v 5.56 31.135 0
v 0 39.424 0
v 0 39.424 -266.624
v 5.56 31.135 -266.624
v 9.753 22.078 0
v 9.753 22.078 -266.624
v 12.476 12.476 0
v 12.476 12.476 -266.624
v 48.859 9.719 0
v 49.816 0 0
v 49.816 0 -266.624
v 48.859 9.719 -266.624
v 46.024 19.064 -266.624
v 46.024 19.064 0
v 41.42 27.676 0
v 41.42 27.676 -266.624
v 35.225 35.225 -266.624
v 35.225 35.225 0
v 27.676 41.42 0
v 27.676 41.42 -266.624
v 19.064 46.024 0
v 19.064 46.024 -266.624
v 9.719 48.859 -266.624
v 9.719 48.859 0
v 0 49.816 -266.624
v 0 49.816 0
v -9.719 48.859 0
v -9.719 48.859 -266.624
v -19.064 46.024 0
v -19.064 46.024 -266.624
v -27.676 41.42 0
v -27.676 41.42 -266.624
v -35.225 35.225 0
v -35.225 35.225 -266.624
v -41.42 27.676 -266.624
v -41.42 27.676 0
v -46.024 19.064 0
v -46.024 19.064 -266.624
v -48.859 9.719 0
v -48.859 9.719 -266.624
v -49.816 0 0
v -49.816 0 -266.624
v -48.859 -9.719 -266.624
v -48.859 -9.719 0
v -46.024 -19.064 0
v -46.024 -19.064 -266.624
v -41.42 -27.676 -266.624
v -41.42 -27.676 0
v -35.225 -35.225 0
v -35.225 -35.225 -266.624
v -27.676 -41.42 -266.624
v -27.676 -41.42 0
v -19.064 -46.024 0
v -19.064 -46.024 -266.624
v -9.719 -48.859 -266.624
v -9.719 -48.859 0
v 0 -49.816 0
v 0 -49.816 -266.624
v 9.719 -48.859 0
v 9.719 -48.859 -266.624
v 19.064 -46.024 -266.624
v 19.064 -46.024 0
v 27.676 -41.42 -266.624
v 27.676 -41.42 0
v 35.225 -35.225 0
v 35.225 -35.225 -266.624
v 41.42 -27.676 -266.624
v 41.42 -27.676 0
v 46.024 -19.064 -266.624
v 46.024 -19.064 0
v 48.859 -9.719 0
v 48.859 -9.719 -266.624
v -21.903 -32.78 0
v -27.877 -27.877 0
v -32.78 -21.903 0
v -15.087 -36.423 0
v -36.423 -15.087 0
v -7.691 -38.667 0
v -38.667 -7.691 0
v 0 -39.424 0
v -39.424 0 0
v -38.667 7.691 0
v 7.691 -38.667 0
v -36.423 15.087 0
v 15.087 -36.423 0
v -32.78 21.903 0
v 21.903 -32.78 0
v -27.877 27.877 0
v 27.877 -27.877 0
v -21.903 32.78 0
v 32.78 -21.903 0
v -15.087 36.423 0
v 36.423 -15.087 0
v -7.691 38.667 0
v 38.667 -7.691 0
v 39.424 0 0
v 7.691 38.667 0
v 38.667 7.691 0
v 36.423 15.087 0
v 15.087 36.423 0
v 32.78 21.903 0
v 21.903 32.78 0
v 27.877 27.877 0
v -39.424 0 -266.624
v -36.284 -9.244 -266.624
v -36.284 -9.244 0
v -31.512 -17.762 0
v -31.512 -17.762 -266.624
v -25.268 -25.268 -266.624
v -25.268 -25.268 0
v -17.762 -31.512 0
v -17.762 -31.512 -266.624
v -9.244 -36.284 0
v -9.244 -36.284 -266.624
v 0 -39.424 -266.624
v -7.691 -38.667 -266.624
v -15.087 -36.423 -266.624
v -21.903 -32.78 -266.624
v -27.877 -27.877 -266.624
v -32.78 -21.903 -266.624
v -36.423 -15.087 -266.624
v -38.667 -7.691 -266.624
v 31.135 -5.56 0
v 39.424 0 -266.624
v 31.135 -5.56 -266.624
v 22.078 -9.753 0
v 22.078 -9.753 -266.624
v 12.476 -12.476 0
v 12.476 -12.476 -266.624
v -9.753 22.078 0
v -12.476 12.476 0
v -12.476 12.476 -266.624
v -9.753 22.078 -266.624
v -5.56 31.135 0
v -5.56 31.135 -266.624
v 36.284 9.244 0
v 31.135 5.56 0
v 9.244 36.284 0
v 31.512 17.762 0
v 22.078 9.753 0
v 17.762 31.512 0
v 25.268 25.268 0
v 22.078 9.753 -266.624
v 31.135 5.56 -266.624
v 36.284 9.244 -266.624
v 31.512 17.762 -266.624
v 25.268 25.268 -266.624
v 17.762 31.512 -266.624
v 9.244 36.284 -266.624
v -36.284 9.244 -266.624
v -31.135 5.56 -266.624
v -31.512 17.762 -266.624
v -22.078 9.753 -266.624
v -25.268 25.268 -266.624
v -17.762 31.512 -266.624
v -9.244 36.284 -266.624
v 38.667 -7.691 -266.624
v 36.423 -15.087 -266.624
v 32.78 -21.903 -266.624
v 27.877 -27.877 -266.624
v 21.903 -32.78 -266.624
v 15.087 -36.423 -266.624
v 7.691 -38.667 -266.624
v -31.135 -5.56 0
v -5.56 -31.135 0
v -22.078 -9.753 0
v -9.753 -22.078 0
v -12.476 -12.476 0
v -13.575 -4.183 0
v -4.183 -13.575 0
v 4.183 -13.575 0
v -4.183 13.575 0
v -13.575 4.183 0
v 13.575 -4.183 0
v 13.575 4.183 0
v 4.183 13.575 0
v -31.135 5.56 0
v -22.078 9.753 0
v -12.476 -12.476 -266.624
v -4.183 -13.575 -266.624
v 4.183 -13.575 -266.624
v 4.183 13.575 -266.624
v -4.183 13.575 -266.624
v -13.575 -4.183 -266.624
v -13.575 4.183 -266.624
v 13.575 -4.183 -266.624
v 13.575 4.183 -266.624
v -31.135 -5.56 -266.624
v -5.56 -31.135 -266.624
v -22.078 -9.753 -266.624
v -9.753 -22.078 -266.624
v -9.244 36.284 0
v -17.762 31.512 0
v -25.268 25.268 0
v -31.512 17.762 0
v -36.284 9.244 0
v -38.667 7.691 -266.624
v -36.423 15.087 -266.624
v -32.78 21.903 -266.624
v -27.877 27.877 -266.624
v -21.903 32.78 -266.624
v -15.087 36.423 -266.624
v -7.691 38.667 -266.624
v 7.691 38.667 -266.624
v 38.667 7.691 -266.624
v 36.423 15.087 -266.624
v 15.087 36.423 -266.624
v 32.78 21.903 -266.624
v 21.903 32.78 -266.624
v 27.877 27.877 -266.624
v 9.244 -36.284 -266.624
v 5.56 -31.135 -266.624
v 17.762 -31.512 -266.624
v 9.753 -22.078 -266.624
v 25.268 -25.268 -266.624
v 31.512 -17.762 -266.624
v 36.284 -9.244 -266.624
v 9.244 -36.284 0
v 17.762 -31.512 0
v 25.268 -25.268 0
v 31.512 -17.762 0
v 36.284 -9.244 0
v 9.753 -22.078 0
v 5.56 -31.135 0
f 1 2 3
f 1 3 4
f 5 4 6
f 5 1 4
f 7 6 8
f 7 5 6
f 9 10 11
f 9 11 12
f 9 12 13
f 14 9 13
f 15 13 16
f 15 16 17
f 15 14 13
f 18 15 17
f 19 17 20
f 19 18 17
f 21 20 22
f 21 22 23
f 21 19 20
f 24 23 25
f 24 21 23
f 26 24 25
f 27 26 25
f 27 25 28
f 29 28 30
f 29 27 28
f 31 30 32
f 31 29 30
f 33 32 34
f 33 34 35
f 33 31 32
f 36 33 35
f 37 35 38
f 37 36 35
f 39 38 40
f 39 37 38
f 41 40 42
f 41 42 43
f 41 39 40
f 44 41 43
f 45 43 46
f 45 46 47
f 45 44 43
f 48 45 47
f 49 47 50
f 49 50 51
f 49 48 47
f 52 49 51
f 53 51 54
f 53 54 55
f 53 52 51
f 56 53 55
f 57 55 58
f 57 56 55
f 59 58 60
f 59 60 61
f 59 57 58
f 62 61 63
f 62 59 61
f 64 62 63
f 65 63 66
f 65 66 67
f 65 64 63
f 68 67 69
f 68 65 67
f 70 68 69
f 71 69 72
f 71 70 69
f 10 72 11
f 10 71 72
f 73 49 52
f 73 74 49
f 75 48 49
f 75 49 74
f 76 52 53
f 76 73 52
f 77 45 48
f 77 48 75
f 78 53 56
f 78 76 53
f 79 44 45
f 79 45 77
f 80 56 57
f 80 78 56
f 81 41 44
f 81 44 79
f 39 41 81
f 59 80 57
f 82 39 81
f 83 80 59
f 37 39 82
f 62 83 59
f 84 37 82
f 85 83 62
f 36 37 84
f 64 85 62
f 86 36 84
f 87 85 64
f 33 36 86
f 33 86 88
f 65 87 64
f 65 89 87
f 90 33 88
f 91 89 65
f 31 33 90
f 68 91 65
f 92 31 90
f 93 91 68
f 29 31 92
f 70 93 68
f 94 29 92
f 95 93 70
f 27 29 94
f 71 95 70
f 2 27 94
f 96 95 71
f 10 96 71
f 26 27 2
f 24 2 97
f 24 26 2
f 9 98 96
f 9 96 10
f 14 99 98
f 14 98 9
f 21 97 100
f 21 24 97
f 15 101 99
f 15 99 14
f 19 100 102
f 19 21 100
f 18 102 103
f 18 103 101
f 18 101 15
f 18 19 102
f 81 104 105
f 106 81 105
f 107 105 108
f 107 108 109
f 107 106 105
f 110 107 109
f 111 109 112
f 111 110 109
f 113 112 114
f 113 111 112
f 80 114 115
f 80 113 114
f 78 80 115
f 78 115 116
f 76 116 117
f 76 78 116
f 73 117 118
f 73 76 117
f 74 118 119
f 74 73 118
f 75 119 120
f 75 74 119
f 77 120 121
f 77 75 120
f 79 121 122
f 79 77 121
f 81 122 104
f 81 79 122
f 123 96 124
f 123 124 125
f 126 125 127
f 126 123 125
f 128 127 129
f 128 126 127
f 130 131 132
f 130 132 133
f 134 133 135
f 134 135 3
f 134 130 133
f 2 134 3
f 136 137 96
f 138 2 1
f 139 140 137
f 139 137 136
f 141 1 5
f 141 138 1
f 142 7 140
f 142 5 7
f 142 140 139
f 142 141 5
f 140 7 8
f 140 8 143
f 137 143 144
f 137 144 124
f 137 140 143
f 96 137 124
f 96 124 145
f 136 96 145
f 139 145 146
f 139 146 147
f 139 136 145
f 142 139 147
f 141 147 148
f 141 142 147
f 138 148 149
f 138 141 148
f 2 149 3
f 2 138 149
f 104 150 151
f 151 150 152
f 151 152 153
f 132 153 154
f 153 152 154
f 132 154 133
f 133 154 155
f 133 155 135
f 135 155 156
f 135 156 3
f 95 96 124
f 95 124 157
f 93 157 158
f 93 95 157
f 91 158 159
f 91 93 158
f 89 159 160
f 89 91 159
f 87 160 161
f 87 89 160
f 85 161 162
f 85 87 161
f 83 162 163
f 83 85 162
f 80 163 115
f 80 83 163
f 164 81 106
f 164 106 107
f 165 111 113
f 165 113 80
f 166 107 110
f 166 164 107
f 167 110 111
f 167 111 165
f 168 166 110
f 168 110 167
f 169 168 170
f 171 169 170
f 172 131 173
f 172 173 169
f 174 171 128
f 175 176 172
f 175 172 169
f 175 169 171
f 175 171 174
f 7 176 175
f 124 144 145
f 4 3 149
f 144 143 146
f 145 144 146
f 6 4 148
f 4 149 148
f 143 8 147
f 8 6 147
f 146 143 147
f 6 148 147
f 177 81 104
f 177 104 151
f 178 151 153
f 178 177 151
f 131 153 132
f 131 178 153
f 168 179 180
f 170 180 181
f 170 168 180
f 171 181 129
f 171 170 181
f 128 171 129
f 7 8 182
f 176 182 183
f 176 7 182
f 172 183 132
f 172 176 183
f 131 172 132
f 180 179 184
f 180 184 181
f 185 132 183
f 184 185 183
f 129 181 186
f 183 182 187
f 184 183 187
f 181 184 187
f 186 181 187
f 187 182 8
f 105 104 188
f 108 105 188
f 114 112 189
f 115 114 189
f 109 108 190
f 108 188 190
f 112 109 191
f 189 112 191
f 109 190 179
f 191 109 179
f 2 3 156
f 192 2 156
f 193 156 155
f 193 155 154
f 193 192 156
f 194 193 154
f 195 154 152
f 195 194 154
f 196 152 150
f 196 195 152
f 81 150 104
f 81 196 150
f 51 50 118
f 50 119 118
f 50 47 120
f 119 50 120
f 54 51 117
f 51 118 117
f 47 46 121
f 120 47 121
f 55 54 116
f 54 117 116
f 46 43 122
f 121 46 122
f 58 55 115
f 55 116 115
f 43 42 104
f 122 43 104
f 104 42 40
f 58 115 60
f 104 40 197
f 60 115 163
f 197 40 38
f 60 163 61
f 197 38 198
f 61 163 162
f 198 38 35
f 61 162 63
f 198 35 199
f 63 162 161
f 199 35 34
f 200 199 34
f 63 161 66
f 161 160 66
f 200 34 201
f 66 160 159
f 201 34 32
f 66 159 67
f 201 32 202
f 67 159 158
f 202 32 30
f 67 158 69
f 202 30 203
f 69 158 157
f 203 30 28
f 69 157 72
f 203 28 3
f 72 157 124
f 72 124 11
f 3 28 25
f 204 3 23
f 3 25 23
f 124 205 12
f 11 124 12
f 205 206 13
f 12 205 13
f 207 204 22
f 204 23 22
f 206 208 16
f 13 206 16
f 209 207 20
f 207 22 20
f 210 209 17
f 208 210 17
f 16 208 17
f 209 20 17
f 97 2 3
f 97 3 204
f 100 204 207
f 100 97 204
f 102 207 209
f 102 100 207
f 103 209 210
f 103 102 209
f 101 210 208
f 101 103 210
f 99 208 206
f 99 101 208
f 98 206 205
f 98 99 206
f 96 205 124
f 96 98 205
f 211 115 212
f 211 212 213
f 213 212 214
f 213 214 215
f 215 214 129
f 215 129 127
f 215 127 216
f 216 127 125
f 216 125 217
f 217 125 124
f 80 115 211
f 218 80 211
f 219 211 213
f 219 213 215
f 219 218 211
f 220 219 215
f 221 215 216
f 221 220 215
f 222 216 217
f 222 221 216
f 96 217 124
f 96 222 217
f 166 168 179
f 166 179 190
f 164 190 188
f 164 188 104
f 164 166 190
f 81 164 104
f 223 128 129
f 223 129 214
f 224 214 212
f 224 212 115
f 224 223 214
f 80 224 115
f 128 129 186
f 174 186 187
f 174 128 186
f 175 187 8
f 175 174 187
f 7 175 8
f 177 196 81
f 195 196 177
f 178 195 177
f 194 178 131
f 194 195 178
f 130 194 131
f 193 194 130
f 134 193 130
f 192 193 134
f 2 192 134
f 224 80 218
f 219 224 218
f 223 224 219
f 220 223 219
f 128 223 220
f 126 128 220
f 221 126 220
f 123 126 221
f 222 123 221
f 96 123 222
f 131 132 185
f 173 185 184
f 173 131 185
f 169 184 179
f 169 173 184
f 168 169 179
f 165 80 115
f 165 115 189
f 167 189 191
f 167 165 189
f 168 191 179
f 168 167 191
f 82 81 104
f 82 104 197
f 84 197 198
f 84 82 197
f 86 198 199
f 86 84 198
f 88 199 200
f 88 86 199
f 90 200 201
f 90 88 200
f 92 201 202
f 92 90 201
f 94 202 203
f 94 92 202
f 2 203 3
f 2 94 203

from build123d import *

# Parameters (mm, degrees)
F0_R     = 49.8159482483
F1_DEPTH = 266.6244804859


with BuildPart() as f1:
    # F0 (on Top) → F1 (new body)
    with BuildSketch(Plane.XY):
        Circle(F0_R)
        with BuildLine():
            ThreePointArc((0, 39.4240655005), (27.8770240573, 27.8770240573), (39.4240655005, 0))
            ThreePointArc((39.4240655005, 0), (27.8770240573, -27.8770240573), (0, -39.4240655005))
            ThreePointArc((0, -39.4240655005), (-27.8770240573, -27.8770240573), (-39.4240655005, 0))
            ThreePointArc((-39.4240655005, 0), (-27.8770240573, 27.8770240573), (0, 39.4240655005))
        make_face(mode=Mode.SUBTRACT)
    extrude(amount=-F1_DEPTH)


with BuildPart() as f1b:
    # F0 (on Top) → F1, piece 2 (new body)
    with BuildSketch(Plane.XY):
        with BuildLine():
            ThreePointArc((0, -39.4240655005), (25.2683708839, -25.2683708839), (39.4240655005, 0))
            ThreePointArc((39.4240655005, 0), (26.6890558836, -7.8345498979), (12.4756539136, -12.4756539136))
            ThreePointArc((12.4756539136, -12.4756539136), (7.8345498979, -26.6890558836), (0, -39.4240655005))
        make_face()
    extrude(amount=-F1_DEPTH)


with BuildPart() as f1c:
    # F0 (on Top) → F1, piece 3 (new body)
    with BuildSketch(Plane.XY):
        with BuildLine():
            ThreePointArc((12.4756539136, 12.4756539136), (26.6890558836, 7.8345498979), (39.4240655005, 0))
            ThreePointArc((39.4240655005, 0), (25.2683708839, 25.2683708839), (0, 39.4240655005))
            ThreePointArc((0, 39.4240655005), (7.8345498979, 26.6890558836), (12.4756539136, 12.4756539136))
        make_face()
    extrude(amount=-F1_DEPTH)


with BuildPart() as f1d:
    # F0 (on Top) → F1, piece 4 (new body)
    with BuildSketch(Plane.XY):
        with BuildLine():
            ThreePointArc((-12.4756539136, 12.4756539136), (-7.8345498979, 26.6890558836), (0, 39.4240655005))
            ThreePointArc((0, 39.4240655005), (-25.2683708839, 25.2683708839), (-39.4240655005, 0))
            ThreePointArc((-39.4240655005, 0), (-26.6890558836, 7.8345498979), (-12.4756539136, 12.4756539136))
        make_face()
    extrude(amount=-F1_DEPTH)


with BuildPart() as f1e:
    # F0 (on Top) → F1, piece 5 (new body)
    with BuildSketch(Plane.XY):
        with BuildLine():
            ThreePointArc((-39.4240655005, 0), (-25.2683708839, -25.2683708839), (0, -39.4240655005))
            ThreePointArc((0, -39.4240655005), (-7.8345498979, -26.6890558836), (-12.4756539136, -12.4756539136))
            ThreePointArc((-12.4756539136, -12.4756539136), (-26.6890558836, -7.8345498979), (-39.4240655005, 0))
        make_face()
    extrude(amount=-F1_DEPTH)


with BuildPart() as f1f:
    # F0 (on Top) → F1, piece 6 (new body)
    with BuildSketch(Plane.XY):
        with BuildLine():
            ThreePointArc((12.4756539136, -12.4756539136), (13.7126723921, 0), (12.4756539136, 12.4756539136))
            ThreePointArc((12.4756539136, 12.4756539136), (0, 13.7126723921), (-12.4756539136, 12.4756539136))
            ThreePointArc((-12.4756539136, 12.4756539136), (-13.7126723921, 0), (-12.4756539136, -12.4756539136))
            ThreePointArc((-12.4756539136, -12.4756539136), (0, -13.7126723921), (12.4756539136, -12.4756539136))
        make_face()
    extrude(amount=-F1_DEPTH)


solid = Compound([f1.part, f1b.part, f1c.part, f1d.part, f1e.part, f1f.part])
